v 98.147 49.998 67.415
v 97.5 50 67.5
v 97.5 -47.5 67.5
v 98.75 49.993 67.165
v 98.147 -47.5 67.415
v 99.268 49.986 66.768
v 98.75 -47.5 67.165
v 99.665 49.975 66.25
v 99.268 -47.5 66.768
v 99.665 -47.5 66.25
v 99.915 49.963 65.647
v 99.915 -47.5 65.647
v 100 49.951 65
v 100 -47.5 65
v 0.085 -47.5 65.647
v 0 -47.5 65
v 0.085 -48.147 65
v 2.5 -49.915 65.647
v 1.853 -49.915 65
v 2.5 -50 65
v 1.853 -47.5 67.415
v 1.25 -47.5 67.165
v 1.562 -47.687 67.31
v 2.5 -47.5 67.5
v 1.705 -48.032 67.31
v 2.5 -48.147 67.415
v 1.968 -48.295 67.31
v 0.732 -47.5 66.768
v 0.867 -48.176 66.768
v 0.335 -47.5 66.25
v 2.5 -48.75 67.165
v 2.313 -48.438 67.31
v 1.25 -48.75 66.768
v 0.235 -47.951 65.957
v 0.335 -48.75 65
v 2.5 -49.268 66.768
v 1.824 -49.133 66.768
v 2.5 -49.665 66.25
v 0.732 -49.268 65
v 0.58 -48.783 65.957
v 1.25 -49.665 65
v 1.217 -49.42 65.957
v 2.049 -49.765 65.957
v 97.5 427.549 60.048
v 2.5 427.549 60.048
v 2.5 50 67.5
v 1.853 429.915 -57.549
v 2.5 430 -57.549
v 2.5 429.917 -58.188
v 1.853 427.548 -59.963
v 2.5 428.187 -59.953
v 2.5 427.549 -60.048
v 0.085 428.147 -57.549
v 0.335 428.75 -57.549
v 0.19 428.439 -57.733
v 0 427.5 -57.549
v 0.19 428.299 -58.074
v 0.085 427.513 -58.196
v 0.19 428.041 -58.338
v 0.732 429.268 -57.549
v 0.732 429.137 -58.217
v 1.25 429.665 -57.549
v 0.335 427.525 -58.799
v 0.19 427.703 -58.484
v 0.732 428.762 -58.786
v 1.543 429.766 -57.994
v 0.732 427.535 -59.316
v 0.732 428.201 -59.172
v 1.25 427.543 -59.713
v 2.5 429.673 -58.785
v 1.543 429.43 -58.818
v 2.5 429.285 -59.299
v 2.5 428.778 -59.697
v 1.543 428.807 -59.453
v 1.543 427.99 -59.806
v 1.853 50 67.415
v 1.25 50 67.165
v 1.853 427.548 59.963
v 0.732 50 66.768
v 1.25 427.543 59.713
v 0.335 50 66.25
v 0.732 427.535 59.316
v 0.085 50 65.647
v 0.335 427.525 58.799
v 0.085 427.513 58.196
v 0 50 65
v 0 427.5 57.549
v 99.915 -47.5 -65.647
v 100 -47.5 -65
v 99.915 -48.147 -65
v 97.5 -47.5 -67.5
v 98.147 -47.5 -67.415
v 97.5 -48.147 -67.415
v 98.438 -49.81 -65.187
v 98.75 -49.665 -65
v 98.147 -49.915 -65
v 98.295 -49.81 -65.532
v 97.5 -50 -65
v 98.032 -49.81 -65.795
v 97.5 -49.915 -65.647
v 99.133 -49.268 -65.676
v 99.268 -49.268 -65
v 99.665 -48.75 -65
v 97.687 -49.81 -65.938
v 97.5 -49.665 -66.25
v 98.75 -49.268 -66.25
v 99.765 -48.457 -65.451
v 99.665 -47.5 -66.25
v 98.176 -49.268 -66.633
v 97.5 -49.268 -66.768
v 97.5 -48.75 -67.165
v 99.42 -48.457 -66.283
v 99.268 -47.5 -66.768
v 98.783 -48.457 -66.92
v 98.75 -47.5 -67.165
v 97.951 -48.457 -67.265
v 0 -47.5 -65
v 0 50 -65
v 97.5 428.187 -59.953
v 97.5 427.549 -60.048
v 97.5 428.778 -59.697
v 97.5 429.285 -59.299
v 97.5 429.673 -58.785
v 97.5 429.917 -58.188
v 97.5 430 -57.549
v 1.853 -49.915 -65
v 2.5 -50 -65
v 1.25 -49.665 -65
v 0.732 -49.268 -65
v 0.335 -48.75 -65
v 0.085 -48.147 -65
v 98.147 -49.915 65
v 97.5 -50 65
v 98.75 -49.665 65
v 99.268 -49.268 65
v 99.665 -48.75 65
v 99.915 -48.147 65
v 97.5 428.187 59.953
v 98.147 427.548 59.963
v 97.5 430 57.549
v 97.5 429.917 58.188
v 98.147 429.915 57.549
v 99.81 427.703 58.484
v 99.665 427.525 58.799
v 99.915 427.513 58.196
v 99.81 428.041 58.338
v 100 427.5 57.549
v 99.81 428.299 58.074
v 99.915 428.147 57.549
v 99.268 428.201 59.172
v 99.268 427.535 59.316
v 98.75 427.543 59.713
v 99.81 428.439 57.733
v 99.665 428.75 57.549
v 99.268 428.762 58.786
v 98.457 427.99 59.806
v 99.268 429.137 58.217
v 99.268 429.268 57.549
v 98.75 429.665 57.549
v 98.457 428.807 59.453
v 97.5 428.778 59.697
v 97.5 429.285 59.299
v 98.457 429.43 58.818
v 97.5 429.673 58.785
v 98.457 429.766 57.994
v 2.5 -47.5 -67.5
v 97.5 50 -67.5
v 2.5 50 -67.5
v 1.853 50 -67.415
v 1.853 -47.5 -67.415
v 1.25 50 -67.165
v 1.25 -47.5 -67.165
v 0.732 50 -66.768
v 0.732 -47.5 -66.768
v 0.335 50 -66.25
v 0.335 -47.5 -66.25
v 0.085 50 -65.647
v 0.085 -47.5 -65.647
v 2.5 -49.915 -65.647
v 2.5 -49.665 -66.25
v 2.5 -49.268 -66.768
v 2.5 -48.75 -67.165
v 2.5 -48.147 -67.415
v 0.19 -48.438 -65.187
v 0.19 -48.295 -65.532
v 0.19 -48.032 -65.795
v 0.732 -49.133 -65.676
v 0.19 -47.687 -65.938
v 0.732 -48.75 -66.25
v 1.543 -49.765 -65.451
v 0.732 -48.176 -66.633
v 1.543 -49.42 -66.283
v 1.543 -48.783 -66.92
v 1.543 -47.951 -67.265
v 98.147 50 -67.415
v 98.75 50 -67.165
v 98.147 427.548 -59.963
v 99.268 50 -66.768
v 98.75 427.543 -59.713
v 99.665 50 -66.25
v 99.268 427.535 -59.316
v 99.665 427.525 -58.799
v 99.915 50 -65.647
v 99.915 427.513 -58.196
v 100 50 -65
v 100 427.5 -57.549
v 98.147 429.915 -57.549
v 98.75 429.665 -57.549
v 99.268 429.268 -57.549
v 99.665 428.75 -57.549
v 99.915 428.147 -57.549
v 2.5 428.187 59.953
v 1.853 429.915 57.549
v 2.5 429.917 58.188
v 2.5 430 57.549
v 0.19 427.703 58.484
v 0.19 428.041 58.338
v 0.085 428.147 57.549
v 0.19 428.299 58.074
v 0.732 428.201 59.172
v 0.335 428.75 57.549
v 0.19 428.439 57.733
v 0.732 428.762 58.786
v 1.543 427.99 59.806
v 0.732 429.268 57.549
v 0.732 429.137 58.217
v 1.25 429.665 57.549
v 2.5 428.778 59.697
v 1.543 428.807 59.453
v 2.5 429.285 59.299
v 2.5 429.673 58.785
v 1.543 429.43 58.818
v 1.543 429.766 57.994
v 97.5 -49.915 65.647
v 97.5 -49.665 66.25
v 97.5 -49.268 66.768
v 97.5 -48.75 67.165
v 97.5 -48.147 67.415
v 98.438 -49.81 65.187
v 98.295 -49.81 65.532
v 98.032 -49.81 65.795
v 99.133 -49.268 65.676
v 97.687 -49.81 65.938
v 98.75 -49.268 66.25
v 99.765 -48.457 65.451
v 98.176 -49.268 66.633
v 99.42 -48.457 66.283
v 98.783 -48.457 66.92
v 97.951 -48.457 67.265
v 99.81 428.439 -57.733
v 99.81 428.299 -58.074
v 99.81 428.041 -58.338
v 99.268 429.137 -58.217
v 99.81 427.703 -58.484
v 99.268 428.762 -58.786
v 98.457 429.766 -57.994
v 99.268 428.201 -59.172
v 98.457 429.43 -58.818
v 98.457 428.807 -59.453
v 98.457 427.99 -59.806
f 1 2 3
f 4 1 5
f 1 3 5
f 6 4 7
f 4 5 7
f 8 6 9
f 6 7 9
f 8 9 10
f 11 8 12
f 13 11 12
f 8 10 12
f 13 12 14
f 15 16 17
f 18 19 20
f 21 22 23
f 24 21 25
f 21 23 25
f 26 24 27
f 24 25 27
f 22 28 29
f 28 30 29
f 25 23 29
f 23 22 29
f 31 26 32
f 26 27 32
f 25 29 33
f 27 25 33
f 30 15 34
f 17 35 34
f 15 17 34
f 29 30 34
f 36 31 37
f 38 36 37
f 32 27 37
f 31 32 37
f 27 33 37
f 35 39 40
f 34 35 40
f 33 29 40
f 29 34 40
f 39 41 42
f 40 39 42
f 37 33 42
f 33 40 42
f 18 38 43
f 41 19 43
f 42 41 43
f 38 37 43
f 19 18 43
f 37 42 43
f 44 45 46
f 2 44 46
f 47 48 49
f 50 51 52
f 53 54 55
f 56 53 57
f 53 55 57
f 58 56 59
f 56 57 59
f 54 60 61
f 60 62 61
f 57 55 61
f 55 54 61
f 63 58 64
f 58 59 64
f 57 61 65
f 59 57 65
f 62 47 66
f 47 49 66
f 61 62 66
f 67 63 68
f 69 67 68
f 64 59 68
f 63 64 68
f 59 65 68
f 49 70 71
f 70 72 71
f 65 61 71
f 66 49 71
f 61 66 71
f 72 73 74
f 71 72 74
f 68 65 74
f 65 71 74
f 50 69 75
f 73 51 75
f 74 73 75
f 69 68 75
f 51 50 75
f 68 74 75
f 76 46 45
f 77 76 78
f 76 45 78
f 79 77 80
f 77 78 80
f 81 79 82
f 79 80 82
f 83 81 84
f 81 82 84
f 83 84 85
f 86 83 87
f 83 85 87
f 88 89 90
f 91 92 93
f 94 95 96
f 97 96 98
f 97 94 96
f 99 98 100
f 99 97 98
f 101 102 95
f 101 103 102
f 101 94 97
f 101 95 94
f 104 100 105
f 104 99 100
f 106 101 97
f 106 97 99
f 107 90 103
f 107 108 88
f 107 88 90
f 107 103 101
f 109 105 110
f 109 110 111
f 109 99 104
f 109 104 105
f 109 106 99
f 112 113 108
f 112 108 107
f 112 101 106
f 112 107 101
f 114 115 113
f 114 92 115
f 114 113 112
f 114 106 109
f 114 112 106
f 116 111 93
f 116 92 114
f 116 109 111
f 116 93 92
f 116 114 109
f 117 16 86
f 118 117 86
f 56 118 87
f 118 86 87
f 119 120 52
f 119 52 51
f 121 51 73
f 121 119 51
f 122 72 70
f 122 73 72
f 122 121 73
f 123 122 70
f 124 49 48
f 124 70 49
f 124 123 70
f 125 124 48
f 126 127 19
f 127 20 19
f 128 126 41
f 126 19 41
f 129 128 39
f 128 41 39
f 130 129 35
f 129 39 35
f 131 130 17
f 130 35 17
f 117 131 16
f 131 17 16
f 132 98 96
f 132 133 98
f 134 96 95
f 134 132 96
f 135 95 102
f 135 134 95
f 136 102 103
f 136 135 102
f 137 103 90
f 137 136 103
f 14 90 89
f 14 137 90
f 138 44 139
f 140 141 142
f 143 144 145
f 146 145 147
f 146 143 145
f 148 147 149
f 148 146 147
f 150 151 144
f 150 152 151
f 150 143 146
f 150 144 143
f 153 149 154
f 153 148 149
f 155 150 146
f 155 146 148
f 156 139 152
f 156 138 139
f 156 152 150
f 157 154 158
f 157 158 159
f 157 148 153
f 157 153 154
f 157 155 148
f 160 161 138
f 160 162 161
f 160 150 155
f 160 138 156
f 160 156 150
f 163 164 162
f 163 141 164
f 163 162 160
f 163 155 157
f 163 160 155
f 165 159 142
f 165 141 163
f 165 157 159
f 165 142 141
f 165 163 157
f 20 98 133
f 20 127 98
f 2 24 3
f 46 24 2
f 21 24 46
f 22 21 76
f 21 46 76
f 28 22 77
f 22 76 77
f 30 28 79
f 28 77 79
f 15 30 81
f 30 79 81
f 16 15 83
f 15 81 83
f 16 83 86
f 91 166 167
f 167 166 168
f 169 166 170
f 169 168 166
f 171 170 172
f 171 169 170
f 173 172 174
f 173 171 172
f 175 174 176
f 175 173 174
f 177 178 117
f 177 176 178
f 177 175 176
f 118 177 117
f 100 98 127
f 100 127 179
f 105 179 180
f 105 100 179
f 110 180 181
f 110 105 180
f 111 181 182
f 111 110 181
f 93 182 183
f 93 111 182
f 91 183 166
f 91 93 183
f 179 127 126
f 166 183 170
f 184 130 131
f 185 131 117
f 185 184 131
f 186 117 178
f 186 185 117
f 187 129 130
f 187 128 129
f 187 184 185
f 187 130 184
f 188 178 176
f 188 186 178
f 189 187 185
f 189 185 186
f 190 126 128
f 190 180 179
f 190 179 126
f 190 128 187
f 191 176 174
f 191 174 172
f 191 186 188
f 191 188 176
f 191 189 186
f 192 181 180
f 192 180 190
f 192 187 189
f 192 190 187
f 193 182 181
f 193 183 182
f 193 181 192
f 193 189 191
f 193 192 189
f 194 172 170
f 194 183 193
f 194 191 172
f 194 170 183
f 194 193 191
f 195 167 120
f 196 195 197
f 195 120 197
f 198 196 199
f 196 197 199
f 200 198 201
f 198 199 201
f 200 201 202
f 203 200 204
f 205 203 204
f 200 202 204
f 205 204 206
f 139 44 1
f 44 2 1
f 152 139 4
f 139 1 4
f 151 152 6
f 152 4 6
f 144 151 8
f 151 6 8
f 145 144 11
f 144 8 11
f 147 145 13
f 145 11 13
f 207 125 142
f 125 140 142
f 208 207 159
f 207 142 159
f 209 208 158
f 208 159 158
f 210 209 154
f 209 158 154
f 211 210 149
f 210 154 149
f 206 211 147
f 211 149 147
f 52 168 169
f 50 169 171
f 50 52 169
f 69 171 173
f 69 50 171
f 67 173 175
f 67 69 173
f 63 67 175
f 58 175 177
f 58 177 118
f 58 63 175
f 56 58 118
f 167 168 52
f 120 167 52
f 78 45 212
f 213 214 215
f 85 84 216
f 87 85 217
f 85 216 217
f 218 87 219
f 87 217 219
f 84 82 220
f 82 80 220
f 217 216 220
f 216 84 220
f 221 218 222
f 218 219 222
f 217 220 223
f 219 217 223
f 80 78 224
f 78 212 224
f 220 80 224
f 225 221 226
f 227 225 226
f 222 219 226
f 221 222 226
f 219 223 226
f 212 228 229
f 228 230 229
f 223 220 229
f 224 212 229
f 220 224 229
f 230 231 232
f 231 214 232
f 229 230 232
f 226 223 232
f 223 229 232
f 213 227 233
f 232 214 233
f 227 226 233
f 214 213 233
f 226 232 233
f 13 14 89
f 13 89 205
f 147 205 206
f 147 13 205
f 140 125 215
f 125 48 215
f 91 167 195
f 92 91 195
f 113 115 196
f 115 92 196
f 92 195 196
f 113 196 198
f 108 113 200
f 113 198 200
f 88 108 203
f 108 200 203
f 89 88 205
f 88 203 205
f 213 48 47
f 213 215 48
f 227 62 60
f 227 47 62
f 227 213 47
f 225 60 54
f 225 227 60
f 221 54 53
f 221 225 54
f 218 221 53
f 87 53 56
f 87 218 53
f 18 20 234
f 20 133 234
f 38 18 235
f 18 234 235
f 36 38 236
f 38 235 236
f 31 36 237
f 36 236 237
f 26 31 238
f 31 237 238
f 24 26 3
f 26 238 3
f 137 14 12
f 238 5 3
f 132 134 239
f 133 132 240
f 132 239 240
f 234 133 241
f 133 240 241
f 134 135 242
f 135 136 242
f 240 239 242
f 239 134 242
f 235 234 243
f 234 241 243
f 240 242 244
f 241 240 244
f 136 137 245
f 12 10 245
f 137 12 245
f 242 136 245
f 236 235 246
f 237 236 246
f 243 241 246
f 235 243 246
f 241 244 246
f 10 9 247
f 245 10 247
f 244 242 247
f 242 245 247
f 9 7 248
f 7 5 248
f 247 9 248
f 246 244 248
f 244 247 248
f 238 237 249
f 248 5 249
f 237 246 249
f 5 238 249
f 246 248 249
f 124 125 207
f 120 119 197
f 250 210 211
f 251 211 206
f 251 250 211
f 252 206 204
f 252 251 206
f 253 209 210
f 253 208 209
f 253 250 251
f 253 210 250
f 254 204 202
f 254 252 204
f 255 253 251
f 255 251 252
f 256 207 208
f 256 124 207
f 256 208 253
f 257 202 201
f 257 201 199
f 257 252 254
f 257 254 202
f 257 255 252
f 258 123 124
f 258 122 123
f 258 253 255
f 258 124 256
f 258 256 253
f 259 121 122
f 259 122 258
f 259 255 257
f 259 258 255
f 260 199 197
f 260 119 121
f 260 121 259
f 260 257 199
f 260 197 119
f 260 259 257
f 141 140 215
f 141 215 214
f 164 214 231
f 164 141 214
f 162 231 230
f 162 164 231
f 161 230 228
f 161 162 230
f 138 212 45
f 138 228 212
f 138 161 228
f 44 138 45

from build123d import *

# Parameters (mm, degrees)
F0_W     = 100
F0_H     = 135
F0_W_2   = 60
F0_H_2   = 120
F1_DEPTH = 100
F2_R     = 2.5


with BuildPart() as f1:
    # F0 (on Right) → F1 (new body)
    with BuildSketch(Plane.YZ):
        Rectangle(F0_W, F0_H)
        Polygon((430, 60), (50, 67.5), (50, -67.5), (430, -60), (370, -60), (370, 60), align=None)
        with Locations((400, 0)):
            Rectangle(F0_W_2, F0_H_2)
    extrude(amount=F1_DEPTH)

    # F2
    f2_edges = [f1.edges().sort_by_distance(p)[0] for p in [
        (100, 240, 63.75),
        (100, 430, 0),
        (100, 240, -63.75),
        (100, 0, 67.5),
        (100, -50, 0),
        (100, 0, -67.5),
        (50, -50, -67.5),
        (0, -50, 0),
        (0, 0, 67.5),
        (0, 240, -63.75),
        (0, 0, -67.5),
        (50, 430, -60),
        (0, 430, 0),
        (50, 430, 60),
        (0, 240, 63.75),
        (50, -50, 67.5),
    ]]
    fillet(f2_edges, radius=F2_R)


solid = f1.part
